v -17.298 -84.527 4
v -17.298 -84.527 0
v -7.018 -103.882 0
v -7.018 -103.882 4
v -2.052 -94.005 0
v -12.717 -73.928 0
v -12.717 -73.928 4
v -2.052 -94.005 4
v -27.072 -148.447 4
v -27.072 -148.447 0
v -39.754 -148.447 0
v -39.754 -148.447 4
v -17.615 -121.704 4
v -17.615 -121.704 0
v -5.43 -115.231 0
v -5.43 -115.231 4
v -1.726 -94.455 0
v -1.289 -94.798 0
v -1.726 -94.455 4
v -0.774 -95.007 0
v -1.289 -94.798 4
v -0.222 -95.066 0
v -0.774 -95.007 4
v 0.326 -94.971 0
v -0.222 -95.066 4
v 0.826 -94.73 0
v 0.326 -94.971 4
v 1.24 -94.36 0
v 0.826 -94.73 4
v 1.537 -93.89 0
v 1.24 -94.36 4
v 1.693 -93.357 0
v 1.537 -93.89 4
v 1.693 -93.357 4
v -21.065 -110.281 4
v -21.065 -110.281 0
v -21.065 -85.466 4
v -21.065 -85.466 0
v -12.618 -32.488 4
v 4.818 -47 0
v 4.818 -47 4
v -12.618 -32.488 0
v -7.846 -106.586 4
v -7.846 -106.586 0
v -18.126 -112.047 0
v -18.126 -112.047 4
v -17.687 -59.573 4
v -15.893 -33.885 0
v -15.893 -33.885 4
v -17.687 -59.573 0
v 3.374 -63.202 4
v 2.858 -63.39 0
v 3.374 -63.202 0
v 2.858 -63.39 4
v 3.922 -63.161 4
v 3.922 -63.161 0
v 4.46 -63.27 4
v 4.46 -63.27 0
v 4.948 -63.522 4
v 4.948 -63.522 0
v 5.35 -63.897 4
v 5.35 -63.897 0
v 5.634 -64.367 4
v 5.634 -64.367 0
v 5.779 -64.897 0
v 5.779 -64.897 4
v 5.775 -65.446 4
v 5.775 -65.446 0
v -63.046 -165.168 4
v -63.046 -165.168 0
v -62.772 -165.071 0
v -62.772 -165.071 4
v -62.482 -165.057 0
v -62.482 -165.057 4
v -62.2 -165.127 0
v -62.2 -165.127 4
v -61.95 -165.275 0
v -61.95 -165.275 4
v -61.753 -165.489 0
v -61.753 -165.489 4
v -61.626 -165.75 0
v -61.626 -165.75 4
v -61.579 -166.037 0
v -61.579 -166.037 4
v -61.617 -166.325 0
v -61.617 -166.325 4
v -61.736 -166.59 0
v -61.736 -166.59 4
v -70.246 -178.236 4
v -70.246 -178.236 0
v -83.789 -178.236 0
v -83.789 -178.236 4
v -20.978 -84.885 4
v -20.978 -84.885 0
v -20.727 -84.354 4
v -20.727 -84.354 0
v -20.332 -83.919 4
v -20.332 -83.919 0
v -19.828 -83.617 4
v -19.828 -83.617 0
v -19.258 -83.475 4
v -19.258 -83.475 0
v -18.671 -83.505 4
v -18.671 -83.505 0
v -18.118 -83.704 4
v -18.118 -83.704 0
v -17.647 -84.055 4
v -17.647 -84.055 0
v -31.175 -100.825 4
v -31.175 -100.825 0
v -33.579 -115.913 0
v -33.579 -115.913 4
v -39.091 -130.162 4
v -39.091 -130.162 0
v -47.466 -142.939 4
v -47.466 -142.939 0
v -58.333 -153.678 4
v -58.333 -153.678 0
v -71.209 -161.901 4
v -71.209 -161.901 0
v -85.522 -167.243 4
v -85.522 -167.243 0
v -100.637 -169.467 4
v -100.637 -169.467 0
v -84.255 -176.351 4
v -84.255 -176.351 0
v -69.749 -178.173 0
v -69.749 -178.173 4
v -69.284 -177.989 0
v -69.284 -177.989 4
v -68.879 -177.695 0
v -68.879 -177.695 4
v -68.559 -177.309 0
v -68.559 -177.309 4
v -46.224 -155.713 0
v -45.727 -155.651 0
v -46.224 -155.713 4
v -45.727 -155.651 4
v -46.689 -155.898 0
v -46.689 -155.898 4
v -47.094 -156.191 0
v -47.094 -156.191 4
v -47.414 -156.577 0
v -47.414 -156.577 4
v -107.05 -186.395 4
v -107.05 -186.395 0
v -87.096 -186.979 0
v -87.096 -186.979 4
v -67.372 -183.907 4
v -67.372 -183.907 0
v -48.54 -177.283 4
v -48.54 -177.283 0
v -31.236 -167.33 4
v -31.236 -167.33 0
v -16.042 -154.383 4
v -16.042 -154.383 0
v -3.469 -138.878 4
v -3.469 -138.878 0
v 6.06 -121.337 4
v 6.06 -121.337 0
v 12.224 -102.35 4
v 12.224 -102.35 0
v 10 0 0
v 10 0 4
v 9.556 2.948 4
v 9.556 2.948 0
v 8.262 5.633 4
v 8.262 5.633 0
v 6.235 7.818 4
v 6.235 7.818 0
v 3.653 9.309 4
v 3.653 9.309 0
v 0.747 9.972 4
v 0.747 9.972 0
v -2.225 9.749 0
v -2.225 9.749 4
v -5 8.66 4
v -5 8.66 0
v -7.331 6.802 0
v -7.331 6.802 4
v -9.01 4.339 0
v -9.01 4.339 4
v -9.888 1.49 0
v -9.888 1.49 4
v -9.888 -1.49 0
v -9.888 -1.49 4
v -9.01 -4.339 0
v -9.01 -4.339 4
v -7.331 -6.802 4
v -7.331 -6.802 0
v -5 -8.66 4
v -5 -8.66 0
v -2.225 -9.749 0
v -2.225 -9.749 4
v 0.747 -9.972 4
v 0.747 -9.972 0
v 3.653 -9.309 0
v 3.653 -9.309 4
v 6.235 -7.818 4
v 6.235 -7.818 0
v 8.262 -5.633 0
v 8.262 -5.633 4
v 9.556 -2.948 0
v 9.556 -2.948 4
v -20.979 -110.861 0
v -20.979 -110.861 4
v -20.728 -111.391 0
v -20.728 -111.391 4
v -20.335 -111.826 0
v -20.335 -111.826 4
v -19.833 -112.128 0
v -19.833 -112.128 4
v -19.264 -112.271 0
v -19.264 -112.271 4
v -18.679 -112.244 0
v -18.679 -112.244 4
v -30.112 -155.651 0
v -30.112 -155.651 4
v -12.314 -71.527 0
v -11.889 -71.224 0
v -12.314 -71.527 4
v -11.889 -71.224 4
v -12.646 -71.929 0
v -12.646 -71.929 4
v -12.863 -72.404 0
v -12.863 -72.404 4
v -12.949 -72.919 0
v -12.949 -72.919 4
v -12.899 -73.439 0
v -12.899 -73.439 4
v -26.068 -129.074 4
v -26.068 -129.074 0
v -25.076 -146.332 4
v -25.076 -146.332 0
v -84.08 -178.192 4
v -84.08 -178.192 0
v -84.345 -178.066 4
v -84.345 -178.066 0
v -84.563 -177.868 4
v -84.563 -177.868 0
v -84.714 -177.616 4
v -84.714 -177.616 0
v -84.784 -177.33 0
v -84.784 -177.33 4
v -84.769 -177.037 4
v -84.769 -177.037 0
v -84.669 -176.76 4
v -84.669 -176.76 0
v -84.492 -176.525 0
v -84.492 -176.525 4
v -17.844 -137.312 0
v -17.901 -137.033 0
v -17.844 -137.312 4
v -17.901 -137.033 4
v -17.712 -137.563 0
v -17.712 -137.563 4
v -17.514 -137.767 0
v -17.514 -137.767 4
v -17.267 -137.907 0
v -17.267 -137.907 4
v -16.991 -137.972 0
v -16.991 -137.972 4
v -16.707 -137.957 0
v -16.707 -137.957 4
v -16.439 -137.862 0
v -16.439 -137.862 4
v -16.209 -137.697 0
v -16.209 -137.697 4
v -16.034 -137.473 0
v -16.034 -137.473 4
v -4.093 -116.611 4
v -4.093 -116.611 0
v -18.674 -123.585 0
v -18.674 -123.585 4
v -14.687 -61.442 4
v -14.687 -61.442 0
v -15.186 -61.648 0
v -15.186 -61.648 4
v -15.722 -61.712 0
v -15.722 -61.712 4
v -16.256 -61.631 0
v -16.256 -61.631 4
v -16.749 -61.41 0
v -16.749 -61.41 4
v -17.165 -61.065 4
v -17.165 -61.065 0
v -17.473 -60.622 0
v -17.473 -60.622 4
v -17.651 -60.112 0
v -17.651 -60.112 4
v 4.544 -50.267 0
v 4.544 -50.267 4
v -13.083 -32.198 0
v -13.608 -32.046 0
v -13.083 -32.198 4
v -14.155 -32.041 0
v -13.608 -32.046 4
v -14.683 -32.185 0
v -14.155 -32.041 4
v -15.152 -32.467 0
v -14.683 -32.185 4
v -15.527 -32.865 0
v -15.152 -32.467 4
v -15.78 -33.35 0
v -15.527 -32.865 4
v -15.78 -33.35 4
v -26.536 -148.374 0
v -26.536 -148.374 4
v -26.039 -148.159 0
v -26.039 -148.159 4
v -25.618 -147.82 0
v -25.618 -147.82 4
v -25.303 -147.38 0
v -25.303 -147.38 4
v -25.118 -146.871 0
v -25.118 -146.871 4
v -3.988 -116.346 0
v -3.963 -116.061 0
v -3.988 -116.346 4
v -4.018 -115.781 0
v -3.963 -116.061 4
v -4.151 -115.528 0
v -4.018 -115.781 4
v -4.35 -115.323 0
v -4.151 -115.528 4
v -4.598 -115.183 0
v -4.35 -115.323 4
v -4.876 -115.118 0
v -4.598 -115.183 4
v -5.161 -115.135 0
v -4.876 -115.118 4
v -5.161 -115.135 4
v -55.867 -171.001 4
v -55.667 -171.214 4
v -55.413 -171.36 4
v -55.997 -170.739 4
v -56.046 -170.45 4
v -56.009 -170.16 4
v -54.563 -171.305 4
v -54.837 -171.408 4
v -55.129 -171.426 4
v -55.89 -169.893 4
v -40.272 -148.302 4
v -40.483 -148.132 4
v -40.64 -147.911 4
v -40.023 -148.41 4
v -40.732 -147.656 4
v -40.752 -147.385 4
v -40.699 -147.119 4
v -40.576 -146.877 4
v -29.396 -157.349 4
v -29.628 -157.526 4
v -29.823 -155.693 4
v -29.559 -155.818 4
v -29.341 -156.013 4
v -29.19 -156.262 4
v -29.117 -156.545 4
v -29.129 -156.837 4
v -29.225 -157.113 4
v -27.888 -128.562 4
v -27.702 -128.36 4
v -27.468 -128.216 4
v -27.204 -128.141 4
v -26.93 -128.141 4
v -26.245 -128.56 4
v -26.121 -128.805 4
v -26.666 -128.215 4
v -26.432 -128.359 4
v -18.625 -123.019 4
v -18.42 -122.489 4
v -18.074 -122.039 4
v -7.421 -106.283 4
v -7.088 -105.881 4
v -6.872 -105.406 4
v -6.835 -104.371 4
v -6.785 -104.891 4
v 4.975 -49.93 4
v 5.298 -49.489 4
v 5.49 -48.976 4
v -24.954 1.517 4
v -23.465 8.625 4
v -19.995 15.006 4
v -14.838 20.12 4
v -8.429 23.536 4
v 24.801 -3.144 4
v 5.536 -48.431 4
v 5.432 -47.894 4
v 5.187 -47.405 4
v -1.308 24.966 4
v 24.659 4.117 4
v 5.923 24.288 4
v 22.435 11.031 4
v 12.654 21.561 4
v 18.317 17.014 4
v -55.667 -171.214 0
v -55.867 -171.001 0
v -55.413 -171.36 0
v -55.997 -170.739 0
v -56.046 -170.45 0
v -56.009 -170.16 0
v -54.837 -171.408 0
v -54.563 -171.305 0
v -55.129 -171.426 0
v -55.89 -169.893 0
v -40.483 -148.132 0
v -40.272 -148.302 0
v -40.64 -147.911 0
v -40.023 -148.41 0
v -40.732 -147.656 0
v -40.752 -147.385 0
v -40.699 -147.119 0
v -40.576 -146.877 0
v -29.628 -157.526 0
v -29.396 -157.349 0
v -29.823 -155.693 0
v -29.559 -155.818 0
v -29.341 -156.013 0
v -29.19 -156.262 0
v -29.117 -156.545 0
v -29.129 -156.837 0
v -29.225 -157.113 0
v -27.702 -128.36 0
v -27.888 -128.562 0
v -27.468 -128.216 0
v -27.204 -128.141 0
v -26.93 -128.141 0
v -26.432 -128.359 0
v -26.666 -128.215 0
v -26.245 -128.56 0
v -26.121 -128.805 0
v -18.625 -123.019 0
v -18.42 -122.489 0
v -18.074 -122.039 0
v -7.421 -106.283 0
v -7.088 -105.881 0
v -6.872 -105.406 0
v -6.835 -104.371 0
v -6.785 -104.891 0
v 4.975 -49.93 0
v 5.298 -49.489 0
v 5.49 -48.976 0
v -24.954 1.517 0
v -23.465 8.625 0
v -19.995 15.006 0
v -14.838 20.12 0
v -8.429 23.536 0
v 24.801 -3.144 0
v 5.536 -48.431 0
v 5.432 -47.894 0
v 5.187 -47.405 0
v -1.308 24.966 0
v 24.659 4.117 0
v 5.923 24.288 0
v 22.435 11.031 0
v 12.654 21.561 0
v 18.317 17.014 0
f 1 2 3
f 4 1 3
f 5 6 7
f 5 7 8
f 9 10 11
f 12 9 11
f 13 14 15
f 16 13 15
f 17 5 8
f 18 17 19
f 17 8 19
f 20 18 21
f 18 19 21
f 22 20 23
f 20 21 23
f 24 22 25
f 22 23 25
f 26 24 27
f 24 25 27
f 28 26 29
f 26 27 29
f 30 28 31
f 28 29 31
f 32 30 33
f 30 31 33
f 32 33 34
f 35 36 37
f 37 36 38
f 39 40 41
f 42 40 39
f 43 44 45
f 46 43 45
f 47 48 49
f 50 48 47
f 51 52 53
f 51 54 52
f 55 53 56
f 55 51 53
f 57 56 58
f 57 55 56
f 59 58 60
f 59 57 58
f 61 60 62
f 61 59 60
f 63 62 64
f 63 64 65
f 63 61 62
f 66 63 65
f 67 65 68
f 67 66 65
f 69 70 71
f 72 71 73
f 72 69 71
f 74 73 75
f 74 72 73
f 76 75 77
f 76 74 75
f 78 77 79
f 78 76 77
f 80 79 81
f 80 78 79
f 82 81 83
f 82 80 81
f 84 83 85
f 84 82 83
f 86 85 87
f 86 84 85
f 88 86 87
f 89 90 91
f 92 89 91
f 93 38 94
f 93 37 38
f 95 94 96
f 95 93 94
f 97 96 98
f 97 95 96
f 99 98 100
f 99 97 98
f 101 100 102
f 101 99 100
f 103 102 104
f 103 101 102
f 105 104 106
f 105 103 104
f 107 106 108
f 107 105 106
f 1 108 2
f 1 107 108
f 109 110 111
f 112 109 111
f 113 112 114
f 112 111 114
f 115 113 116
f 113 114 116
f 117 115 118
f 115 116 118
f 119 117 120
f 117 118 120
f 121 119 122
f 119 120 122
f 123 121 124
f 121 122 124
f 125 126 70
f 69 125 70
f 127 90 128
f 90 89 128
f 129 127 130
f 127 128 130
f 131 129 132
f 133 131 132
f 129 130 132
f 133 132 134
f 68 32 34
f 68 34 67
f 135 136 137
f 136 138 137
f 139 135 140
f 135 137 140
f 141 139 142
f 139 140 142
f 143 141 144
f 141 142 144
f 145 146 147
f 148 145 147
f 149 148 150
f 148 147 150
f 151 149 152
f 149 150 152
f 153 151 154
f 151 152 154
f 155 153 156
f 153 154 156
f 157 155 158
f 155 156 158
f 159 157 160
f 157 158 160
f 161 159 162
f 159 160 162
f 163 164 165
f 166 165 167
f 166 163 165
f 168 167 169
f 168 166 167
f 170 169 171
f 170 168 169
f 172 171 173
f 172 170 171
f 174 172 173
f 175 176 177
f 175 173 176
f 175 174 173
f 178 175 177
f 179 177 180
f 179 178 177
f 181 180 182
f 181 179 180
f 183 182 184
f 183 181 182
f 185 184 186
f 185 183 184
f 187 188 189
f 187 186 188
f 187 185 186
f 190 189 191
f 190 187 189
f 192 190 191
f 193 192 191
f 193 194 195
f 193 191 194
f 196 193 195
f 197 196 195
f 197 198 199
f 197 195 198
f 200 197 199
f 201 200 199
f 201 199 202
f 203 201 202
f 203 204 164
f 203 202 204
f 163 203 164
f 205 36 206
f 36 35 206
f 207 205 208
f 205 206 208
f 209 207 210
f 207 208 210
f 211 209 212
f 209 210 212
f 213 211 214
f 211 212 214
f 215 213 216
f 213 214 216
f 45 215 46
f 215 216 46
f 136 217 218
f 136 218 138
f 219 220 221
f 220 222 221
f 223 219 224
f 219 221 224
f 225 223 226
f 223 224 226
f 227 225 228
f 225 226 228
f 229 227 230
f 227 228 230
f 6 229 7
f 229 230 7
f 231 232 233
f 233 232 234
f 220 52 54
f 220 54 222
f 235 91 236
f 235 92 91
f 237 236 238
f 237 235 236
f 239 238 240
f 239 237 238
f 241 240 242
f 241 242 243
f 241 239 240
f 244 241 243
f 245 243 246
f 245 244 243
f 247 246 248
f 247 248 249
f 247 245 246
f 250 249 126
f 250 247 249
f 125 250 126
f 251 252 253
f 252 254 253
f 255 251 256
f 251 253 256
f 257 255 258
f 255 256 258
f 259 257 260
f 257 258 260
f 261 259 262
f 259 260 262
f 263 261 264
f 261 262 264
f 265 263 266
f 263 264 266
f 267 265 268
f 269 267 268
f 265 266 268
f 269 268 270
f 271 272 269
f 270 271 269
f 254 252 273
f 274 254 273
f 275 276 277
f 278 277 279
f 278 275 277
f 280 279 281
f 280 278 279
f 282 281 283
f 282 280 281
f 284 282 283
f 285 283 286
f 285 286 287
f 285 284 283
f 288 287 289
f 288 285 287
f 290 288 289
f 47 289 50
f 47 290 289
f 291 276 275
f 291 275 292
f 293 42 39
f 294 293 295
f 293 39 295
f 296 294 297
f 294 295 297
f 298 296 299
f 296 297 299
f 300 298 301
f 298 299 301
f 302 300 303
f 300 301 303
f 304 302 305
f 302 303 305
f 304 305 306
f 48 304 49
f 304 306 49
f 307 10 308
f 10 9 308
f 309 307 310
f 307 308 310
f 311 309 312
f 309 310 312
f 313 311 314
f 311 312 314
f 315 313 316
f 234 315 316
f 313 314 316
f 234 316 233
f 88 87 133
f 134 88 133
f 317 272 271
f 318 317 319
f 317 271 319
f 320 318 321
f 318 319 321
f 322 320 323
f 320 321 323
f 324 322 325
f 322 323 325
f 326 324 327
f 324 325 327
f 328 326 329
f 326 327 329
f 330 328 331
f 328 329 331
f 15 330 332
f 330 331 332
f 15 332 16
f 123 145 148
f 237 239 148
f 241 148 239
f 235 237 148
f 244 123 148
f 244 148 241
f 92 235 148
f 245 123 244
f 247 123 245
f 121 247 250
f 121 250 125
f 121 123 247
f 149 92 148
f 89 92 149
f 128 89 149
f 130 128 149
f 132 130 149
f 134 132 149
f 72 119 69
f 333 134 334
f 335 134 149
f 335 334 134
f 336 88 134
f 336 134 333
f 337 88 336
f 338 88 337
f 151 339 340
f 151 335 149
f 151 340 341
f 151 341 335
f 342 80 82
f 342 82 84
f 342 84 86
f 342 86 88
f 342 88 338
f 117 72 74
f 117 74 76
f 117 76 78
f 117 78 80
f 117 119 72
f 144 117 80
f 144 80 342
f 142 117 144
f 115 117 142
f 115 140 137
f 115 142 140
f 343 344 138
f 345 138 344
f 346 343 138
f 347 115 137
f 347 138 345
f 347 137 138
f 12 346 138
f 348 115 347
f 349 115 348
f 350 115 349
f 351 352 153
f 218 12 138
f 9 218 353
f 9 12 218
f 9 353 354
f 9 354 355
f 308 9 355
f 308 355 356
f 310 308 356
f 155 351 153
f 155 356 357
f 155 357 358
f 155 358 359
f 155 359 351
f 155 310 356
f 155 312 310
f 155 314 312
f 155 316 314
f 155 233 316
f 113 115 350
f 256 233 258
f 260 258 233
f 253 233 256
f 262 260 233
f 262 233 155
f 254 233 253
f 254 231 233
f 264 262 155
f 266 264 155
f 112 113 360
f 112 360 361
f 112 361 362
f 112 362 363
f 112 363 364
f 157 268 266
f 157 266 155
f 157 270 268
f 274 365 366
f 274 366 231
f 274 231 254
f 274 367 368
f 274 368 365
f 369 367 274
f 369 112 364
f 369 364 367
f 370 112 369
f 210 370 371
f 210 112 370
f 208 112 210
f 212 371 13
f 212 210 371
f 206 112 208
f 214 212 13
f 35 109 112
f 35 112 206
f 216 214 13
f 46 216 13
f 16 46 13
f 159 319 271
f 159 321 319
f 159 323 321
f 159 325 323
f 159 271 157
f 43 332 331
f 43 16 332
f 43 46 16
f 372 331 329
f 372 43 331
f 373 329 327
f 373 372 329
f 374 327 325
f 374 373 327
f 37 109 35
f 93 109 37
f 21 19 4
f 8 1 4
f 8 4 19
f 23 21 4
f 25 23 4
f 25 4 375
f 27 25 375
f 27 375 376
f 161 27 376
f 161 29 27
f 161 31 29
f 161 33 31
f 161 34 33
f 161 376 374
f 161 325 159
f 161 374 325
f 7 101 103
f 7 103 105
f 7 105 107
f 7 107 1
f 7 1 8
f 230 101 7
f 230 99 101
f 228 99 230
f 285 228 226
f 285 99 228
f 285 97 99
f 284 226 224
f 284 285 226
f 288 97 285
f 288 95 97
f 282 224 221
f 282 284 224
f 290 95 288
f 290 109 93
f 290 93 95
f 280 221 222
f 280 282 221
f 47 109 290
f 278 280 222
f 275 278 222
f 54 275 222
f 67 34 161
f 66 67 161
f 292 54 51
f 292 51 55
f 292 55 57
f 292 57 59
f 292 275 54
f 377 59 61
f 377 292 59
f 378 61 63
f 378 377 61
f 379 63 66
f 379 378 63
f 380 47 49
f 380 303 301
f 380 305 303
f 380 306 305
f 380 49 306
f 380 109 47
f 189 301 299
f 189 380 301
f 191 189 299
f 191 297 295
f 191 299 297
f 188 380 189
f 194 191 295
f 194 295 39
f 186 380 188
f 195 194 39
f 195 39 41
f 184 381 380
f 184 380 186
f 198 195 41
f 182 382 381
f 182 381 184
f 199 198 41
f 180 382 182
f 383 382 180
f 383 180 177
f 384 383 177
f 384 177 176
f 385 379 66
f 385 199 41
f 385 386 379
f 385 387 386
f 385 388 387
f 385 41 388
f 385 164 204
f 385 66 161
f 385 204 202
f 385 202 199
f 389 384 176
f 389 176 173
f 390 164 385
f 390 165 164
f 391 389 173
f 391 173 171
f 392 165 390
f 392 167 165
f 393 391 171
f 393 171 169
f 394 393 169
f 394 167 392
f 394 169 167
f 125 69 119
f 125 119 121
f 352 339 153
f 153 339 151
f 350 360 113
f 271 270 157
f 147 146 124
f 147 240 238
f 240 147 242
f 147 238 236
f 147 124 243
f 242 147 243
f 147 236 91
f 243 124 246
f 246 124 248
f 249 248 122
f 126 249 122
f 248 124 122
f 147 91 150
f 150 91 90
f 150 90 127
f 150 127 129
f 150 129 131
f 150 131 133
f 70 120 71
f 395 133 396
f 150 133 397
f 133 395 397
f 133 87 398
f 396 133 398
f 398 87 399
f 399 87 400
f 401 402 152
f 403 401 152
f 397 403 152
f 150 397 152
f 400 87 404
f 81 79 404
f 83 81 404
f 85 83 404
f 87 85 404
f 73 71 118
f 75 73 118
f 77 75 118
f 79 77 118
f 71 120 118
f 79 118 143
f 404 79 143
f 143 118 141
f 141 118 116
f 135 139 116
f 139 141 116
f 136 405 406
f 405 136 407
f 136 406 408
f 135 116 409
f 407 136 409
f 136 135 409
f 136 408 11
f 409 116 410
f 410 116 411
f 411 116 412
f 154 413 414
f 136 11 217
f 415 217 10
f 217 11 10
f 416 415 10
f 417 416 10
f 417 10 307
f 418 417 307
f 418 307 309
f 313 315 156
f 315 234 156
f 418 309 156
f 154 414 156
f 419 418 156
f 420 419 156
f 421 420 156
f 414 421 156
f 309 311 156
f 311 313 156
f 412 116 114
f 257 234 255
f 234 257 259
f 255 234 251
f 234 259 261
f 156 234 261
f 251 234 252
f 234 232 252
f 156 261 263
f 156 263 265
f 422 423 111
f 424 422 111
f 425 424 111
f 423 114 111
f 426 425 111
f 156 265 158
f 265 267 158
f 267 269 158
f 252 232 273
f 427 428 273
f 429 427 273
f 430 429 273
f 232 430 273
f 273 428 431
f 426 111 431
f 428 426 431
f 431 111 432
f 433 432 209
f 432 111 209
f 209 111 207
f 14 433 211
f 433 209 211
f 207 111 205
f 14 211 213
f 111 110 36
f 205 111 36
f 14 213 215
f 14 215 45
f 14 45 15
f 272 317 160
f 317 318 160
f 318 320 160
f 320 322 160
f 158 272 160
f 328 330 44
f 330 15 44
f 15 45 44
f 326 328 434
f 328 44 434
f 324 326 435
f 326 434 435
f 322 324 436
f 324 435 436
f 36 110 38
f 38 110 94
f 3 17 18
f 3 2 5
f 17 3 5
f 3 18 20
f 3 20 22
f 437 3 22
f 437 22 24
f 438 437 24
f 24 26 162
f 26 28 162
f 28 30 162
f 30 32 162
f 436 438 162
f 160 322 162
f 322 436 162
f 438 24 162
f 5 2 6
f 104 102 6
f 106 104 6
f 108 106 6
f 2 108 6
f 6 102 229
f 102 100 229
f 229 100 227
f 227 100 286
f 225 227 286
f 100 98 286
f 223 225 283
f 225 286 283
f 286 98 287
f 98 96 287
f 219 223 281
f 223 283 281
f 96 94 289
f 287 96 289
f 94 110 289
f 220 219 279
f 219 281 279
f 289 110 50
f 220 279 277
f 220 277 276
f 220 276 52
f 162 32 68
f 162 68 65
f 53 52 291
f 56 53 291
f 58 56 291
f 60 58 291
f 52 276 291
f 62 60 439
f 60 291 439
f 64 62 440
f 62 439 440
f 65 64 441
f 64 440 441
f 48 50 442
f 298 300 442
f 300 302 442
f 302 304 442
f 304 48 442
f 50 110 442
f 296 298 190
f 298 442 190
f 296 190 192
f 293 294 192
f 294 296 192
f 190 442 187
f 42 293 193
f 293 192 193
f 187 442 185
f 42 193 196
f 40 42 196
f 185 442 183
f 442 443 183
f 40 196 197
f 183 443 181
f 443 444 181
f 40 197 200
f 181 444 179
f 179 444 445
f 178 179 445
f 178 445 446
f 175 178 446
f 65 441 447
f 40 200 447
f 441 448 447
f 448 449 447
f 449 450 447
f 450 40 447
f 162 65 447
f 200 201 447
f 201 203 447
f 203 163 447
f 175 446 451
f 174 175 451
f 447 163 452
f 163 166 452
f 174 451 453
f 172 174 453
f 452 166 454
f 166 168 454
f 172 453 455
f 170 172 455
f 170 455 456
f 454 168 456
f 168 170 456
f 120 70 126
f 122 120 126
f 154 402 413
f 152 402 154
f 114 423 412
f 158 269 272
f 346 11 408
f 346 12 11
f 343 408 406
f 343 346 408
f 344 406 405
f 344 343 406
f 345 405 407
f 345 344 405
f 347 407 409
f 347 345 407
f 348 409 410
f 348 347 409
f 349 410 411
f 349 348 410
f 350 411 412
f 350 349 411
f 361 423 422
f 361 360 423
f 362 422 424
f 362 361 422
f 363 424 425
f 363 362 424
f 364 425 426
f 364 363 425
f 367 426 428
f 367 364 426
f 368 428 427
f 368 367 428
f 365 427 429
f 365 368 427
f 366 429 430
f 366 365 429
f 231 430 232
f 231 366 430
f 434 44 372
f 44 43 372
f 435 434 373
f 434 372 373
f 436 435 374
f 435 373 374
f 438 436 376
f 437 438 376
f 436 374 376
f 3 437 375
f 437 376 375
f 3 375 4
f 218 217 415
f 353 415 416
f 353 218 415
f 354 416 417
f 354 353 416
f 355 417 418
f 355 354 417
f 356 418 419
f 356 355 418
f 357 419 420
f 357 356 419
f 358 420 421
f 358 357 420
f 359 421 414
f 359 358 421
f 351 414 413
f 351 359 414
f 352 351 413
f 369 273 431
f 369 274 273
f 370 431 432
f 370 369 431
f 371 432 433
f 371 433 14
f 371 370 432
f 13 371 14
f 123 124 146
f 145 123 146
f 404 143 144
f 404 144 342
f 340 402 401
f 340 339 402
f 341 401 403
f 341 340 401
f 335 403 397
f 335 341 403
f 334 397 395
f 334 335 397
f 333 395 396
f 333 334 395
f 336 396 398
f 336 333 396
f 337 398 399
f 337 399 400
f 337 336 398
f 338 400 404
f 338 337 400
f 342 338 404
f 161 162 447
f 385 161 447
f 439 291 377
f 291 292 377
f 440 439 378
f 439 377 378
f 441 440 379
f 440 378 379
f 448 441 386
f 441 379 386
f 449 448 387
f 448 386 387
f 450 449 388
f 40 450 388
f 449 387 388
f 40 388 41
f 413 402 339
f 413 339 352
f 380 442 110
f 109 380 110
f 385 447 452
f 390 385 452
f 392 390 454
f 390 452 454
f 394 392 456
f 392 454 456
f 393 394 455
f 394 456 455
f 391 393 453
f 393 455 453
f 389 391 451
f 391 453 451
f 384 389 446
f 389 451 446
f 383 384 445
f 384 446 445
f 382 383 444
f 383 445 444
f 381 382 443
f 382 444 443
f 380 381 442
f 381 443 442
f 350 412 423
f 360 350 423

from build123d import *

# Parameters (mm, degrees)
BOSS_EXTRUDE1_DEPTH = 4
SKETCH1_3_R         = 10
CUT_EXTRUDE2_DEPTH  = 19.5
CUT_EXTRUDE3_DEPTH  = 59.5
FILLET2_R           = 2
FILLET9_R           = 2
FILLET10_R          = 1


with BuildPart() as part:
    # Sketch1 → Boss-Extrude1 (new body)
    with BuildSketch(Plane.XY):
        with BuildLine():
            Line((-24.953935647, 1.516936291), (-31.175265199, -100.825303282))
            ThreePointArc((-31.175265199, -100.825303282), (-52.615931746, -148.5955614), (-100.637442791, -169.467413729))
            Line((-100.637442791, -169.467413729), (-107.049597612, -186.395076324))
            ThreePointArc((-107.049597612, -186.395076324), (-31.236424704, -167.329888663), (12.223577372, -102.350301202))
            Line((12.223577372, -102.350301202), (24.801457775, -3.144470101))
            ThreePointArc((24.801457775, -3.144470101), (2.331949777, 24.891002596), (-24.953935647, 1.516936291))
        make_face()
    extrude(amount=BOSS_EXTRUDE1_DEPTH)

    # Sketch1<3> → Cut-Extrude2 (cut)
    with BuildSketch(Plane.XY):
        Circle(SKETCH1_3_R)
    extrude(amount=CUT_EXTRUDE2_DEPTH, mode=Mode.SUBTRACT)

    # Sketch1<4> → Cut-Extrude3 (cut)
    with BuildSketch(Plane.XY):
        Polygon((6.347009132, -61.537145709), (-13.655055469, -72.161869066), (0.810016745, -99.393760114), align=None)
        Polygon((-21.064699943, -77.437028338), (-6.079431787, -105.648238327), (-21.064699943, -113.608133056), align=None)
        Polygon((-26.234337885, -155.650813652), (-46.824530665, -155.650813652), (-57.99672275, -173.202762284), align=None)
        Polygon((-59.711910653, -163.410469366), (-69.148377202, -178.235525617), (-87.829466791, -178.235525617), align=None)
        Polygon((-26.234337885, -126.17530166), (-24.953935647, -148.446836425), (-41.663691875, -148.446836425), align=None)
        Polygon((-18.747269764, -122.305223747), (-2.374159237, -113.608133056), (-17.707255347, -140.395411768), align=None)
        Polygon((-17.949592316, -63.337916036), (7.016311499, -48.830036106), (-15.620624799, -29.988511388), align=None)
    extrude(amount=CUT_EXTRUDE3_DEPTH, mode=Mode.SUBTRACT)

    # Fillet2
    fillet2_edges = [part.edges().sort_by_distance(p)[0] for p in [
        (-15.620624799, -29.988511388, 2),
        (-17.949592316, -63.337916036, 2),
        (7.016311499, -48.830036106, 2),
        (-21.064699943, -77.437028338, 2),
        (-21.064699943, -113.608133056, 2),
        (-6.079431787, -105.648238327, 2),
        (0.810016745, -99.393760114, 2),
        (6.347009132, -61.537145709, 2),
        (-13.655055469, -72.161869066, 2),
    ]]
    fillet(fillet2_edges, radius=FILLET2_R)

    # Fillet9
    fillet9_edges = [part.edges().sort_by_distance(p)[0] for p in [
        (-18.747269764, -122.305223747, 2),
        (-24.953935647, -148.446836425, 2),
        (-46.824530665, -155.650813652, 2),
        (-69.148377202, -178.235525617, 2),
    ]]
    fillet(fillet9_edges, radius=FILLET9_R)

    # Fillet10
    fillet10_edges = [part.edges().sort_by_distance(p)[0] for p in [
        (-17.707255347, -140.395411768, 2),
        (-2.374159237, -113.608133056, 2),
        (-26.234337885, -126.17530166, 2),
        (-41.663691875, -148.446836425, 2),
        (-57.99672275, -173.202762284, 2),
        (-26.234337885, -155.650813652, 2),
        (-87.829466791, -178.235525617, 2),
        (-59.711910653, -163.410469366, 2),
    ]]
    fillet(fillet10_edges, radius=FILLET10_R)


solid = part.part
